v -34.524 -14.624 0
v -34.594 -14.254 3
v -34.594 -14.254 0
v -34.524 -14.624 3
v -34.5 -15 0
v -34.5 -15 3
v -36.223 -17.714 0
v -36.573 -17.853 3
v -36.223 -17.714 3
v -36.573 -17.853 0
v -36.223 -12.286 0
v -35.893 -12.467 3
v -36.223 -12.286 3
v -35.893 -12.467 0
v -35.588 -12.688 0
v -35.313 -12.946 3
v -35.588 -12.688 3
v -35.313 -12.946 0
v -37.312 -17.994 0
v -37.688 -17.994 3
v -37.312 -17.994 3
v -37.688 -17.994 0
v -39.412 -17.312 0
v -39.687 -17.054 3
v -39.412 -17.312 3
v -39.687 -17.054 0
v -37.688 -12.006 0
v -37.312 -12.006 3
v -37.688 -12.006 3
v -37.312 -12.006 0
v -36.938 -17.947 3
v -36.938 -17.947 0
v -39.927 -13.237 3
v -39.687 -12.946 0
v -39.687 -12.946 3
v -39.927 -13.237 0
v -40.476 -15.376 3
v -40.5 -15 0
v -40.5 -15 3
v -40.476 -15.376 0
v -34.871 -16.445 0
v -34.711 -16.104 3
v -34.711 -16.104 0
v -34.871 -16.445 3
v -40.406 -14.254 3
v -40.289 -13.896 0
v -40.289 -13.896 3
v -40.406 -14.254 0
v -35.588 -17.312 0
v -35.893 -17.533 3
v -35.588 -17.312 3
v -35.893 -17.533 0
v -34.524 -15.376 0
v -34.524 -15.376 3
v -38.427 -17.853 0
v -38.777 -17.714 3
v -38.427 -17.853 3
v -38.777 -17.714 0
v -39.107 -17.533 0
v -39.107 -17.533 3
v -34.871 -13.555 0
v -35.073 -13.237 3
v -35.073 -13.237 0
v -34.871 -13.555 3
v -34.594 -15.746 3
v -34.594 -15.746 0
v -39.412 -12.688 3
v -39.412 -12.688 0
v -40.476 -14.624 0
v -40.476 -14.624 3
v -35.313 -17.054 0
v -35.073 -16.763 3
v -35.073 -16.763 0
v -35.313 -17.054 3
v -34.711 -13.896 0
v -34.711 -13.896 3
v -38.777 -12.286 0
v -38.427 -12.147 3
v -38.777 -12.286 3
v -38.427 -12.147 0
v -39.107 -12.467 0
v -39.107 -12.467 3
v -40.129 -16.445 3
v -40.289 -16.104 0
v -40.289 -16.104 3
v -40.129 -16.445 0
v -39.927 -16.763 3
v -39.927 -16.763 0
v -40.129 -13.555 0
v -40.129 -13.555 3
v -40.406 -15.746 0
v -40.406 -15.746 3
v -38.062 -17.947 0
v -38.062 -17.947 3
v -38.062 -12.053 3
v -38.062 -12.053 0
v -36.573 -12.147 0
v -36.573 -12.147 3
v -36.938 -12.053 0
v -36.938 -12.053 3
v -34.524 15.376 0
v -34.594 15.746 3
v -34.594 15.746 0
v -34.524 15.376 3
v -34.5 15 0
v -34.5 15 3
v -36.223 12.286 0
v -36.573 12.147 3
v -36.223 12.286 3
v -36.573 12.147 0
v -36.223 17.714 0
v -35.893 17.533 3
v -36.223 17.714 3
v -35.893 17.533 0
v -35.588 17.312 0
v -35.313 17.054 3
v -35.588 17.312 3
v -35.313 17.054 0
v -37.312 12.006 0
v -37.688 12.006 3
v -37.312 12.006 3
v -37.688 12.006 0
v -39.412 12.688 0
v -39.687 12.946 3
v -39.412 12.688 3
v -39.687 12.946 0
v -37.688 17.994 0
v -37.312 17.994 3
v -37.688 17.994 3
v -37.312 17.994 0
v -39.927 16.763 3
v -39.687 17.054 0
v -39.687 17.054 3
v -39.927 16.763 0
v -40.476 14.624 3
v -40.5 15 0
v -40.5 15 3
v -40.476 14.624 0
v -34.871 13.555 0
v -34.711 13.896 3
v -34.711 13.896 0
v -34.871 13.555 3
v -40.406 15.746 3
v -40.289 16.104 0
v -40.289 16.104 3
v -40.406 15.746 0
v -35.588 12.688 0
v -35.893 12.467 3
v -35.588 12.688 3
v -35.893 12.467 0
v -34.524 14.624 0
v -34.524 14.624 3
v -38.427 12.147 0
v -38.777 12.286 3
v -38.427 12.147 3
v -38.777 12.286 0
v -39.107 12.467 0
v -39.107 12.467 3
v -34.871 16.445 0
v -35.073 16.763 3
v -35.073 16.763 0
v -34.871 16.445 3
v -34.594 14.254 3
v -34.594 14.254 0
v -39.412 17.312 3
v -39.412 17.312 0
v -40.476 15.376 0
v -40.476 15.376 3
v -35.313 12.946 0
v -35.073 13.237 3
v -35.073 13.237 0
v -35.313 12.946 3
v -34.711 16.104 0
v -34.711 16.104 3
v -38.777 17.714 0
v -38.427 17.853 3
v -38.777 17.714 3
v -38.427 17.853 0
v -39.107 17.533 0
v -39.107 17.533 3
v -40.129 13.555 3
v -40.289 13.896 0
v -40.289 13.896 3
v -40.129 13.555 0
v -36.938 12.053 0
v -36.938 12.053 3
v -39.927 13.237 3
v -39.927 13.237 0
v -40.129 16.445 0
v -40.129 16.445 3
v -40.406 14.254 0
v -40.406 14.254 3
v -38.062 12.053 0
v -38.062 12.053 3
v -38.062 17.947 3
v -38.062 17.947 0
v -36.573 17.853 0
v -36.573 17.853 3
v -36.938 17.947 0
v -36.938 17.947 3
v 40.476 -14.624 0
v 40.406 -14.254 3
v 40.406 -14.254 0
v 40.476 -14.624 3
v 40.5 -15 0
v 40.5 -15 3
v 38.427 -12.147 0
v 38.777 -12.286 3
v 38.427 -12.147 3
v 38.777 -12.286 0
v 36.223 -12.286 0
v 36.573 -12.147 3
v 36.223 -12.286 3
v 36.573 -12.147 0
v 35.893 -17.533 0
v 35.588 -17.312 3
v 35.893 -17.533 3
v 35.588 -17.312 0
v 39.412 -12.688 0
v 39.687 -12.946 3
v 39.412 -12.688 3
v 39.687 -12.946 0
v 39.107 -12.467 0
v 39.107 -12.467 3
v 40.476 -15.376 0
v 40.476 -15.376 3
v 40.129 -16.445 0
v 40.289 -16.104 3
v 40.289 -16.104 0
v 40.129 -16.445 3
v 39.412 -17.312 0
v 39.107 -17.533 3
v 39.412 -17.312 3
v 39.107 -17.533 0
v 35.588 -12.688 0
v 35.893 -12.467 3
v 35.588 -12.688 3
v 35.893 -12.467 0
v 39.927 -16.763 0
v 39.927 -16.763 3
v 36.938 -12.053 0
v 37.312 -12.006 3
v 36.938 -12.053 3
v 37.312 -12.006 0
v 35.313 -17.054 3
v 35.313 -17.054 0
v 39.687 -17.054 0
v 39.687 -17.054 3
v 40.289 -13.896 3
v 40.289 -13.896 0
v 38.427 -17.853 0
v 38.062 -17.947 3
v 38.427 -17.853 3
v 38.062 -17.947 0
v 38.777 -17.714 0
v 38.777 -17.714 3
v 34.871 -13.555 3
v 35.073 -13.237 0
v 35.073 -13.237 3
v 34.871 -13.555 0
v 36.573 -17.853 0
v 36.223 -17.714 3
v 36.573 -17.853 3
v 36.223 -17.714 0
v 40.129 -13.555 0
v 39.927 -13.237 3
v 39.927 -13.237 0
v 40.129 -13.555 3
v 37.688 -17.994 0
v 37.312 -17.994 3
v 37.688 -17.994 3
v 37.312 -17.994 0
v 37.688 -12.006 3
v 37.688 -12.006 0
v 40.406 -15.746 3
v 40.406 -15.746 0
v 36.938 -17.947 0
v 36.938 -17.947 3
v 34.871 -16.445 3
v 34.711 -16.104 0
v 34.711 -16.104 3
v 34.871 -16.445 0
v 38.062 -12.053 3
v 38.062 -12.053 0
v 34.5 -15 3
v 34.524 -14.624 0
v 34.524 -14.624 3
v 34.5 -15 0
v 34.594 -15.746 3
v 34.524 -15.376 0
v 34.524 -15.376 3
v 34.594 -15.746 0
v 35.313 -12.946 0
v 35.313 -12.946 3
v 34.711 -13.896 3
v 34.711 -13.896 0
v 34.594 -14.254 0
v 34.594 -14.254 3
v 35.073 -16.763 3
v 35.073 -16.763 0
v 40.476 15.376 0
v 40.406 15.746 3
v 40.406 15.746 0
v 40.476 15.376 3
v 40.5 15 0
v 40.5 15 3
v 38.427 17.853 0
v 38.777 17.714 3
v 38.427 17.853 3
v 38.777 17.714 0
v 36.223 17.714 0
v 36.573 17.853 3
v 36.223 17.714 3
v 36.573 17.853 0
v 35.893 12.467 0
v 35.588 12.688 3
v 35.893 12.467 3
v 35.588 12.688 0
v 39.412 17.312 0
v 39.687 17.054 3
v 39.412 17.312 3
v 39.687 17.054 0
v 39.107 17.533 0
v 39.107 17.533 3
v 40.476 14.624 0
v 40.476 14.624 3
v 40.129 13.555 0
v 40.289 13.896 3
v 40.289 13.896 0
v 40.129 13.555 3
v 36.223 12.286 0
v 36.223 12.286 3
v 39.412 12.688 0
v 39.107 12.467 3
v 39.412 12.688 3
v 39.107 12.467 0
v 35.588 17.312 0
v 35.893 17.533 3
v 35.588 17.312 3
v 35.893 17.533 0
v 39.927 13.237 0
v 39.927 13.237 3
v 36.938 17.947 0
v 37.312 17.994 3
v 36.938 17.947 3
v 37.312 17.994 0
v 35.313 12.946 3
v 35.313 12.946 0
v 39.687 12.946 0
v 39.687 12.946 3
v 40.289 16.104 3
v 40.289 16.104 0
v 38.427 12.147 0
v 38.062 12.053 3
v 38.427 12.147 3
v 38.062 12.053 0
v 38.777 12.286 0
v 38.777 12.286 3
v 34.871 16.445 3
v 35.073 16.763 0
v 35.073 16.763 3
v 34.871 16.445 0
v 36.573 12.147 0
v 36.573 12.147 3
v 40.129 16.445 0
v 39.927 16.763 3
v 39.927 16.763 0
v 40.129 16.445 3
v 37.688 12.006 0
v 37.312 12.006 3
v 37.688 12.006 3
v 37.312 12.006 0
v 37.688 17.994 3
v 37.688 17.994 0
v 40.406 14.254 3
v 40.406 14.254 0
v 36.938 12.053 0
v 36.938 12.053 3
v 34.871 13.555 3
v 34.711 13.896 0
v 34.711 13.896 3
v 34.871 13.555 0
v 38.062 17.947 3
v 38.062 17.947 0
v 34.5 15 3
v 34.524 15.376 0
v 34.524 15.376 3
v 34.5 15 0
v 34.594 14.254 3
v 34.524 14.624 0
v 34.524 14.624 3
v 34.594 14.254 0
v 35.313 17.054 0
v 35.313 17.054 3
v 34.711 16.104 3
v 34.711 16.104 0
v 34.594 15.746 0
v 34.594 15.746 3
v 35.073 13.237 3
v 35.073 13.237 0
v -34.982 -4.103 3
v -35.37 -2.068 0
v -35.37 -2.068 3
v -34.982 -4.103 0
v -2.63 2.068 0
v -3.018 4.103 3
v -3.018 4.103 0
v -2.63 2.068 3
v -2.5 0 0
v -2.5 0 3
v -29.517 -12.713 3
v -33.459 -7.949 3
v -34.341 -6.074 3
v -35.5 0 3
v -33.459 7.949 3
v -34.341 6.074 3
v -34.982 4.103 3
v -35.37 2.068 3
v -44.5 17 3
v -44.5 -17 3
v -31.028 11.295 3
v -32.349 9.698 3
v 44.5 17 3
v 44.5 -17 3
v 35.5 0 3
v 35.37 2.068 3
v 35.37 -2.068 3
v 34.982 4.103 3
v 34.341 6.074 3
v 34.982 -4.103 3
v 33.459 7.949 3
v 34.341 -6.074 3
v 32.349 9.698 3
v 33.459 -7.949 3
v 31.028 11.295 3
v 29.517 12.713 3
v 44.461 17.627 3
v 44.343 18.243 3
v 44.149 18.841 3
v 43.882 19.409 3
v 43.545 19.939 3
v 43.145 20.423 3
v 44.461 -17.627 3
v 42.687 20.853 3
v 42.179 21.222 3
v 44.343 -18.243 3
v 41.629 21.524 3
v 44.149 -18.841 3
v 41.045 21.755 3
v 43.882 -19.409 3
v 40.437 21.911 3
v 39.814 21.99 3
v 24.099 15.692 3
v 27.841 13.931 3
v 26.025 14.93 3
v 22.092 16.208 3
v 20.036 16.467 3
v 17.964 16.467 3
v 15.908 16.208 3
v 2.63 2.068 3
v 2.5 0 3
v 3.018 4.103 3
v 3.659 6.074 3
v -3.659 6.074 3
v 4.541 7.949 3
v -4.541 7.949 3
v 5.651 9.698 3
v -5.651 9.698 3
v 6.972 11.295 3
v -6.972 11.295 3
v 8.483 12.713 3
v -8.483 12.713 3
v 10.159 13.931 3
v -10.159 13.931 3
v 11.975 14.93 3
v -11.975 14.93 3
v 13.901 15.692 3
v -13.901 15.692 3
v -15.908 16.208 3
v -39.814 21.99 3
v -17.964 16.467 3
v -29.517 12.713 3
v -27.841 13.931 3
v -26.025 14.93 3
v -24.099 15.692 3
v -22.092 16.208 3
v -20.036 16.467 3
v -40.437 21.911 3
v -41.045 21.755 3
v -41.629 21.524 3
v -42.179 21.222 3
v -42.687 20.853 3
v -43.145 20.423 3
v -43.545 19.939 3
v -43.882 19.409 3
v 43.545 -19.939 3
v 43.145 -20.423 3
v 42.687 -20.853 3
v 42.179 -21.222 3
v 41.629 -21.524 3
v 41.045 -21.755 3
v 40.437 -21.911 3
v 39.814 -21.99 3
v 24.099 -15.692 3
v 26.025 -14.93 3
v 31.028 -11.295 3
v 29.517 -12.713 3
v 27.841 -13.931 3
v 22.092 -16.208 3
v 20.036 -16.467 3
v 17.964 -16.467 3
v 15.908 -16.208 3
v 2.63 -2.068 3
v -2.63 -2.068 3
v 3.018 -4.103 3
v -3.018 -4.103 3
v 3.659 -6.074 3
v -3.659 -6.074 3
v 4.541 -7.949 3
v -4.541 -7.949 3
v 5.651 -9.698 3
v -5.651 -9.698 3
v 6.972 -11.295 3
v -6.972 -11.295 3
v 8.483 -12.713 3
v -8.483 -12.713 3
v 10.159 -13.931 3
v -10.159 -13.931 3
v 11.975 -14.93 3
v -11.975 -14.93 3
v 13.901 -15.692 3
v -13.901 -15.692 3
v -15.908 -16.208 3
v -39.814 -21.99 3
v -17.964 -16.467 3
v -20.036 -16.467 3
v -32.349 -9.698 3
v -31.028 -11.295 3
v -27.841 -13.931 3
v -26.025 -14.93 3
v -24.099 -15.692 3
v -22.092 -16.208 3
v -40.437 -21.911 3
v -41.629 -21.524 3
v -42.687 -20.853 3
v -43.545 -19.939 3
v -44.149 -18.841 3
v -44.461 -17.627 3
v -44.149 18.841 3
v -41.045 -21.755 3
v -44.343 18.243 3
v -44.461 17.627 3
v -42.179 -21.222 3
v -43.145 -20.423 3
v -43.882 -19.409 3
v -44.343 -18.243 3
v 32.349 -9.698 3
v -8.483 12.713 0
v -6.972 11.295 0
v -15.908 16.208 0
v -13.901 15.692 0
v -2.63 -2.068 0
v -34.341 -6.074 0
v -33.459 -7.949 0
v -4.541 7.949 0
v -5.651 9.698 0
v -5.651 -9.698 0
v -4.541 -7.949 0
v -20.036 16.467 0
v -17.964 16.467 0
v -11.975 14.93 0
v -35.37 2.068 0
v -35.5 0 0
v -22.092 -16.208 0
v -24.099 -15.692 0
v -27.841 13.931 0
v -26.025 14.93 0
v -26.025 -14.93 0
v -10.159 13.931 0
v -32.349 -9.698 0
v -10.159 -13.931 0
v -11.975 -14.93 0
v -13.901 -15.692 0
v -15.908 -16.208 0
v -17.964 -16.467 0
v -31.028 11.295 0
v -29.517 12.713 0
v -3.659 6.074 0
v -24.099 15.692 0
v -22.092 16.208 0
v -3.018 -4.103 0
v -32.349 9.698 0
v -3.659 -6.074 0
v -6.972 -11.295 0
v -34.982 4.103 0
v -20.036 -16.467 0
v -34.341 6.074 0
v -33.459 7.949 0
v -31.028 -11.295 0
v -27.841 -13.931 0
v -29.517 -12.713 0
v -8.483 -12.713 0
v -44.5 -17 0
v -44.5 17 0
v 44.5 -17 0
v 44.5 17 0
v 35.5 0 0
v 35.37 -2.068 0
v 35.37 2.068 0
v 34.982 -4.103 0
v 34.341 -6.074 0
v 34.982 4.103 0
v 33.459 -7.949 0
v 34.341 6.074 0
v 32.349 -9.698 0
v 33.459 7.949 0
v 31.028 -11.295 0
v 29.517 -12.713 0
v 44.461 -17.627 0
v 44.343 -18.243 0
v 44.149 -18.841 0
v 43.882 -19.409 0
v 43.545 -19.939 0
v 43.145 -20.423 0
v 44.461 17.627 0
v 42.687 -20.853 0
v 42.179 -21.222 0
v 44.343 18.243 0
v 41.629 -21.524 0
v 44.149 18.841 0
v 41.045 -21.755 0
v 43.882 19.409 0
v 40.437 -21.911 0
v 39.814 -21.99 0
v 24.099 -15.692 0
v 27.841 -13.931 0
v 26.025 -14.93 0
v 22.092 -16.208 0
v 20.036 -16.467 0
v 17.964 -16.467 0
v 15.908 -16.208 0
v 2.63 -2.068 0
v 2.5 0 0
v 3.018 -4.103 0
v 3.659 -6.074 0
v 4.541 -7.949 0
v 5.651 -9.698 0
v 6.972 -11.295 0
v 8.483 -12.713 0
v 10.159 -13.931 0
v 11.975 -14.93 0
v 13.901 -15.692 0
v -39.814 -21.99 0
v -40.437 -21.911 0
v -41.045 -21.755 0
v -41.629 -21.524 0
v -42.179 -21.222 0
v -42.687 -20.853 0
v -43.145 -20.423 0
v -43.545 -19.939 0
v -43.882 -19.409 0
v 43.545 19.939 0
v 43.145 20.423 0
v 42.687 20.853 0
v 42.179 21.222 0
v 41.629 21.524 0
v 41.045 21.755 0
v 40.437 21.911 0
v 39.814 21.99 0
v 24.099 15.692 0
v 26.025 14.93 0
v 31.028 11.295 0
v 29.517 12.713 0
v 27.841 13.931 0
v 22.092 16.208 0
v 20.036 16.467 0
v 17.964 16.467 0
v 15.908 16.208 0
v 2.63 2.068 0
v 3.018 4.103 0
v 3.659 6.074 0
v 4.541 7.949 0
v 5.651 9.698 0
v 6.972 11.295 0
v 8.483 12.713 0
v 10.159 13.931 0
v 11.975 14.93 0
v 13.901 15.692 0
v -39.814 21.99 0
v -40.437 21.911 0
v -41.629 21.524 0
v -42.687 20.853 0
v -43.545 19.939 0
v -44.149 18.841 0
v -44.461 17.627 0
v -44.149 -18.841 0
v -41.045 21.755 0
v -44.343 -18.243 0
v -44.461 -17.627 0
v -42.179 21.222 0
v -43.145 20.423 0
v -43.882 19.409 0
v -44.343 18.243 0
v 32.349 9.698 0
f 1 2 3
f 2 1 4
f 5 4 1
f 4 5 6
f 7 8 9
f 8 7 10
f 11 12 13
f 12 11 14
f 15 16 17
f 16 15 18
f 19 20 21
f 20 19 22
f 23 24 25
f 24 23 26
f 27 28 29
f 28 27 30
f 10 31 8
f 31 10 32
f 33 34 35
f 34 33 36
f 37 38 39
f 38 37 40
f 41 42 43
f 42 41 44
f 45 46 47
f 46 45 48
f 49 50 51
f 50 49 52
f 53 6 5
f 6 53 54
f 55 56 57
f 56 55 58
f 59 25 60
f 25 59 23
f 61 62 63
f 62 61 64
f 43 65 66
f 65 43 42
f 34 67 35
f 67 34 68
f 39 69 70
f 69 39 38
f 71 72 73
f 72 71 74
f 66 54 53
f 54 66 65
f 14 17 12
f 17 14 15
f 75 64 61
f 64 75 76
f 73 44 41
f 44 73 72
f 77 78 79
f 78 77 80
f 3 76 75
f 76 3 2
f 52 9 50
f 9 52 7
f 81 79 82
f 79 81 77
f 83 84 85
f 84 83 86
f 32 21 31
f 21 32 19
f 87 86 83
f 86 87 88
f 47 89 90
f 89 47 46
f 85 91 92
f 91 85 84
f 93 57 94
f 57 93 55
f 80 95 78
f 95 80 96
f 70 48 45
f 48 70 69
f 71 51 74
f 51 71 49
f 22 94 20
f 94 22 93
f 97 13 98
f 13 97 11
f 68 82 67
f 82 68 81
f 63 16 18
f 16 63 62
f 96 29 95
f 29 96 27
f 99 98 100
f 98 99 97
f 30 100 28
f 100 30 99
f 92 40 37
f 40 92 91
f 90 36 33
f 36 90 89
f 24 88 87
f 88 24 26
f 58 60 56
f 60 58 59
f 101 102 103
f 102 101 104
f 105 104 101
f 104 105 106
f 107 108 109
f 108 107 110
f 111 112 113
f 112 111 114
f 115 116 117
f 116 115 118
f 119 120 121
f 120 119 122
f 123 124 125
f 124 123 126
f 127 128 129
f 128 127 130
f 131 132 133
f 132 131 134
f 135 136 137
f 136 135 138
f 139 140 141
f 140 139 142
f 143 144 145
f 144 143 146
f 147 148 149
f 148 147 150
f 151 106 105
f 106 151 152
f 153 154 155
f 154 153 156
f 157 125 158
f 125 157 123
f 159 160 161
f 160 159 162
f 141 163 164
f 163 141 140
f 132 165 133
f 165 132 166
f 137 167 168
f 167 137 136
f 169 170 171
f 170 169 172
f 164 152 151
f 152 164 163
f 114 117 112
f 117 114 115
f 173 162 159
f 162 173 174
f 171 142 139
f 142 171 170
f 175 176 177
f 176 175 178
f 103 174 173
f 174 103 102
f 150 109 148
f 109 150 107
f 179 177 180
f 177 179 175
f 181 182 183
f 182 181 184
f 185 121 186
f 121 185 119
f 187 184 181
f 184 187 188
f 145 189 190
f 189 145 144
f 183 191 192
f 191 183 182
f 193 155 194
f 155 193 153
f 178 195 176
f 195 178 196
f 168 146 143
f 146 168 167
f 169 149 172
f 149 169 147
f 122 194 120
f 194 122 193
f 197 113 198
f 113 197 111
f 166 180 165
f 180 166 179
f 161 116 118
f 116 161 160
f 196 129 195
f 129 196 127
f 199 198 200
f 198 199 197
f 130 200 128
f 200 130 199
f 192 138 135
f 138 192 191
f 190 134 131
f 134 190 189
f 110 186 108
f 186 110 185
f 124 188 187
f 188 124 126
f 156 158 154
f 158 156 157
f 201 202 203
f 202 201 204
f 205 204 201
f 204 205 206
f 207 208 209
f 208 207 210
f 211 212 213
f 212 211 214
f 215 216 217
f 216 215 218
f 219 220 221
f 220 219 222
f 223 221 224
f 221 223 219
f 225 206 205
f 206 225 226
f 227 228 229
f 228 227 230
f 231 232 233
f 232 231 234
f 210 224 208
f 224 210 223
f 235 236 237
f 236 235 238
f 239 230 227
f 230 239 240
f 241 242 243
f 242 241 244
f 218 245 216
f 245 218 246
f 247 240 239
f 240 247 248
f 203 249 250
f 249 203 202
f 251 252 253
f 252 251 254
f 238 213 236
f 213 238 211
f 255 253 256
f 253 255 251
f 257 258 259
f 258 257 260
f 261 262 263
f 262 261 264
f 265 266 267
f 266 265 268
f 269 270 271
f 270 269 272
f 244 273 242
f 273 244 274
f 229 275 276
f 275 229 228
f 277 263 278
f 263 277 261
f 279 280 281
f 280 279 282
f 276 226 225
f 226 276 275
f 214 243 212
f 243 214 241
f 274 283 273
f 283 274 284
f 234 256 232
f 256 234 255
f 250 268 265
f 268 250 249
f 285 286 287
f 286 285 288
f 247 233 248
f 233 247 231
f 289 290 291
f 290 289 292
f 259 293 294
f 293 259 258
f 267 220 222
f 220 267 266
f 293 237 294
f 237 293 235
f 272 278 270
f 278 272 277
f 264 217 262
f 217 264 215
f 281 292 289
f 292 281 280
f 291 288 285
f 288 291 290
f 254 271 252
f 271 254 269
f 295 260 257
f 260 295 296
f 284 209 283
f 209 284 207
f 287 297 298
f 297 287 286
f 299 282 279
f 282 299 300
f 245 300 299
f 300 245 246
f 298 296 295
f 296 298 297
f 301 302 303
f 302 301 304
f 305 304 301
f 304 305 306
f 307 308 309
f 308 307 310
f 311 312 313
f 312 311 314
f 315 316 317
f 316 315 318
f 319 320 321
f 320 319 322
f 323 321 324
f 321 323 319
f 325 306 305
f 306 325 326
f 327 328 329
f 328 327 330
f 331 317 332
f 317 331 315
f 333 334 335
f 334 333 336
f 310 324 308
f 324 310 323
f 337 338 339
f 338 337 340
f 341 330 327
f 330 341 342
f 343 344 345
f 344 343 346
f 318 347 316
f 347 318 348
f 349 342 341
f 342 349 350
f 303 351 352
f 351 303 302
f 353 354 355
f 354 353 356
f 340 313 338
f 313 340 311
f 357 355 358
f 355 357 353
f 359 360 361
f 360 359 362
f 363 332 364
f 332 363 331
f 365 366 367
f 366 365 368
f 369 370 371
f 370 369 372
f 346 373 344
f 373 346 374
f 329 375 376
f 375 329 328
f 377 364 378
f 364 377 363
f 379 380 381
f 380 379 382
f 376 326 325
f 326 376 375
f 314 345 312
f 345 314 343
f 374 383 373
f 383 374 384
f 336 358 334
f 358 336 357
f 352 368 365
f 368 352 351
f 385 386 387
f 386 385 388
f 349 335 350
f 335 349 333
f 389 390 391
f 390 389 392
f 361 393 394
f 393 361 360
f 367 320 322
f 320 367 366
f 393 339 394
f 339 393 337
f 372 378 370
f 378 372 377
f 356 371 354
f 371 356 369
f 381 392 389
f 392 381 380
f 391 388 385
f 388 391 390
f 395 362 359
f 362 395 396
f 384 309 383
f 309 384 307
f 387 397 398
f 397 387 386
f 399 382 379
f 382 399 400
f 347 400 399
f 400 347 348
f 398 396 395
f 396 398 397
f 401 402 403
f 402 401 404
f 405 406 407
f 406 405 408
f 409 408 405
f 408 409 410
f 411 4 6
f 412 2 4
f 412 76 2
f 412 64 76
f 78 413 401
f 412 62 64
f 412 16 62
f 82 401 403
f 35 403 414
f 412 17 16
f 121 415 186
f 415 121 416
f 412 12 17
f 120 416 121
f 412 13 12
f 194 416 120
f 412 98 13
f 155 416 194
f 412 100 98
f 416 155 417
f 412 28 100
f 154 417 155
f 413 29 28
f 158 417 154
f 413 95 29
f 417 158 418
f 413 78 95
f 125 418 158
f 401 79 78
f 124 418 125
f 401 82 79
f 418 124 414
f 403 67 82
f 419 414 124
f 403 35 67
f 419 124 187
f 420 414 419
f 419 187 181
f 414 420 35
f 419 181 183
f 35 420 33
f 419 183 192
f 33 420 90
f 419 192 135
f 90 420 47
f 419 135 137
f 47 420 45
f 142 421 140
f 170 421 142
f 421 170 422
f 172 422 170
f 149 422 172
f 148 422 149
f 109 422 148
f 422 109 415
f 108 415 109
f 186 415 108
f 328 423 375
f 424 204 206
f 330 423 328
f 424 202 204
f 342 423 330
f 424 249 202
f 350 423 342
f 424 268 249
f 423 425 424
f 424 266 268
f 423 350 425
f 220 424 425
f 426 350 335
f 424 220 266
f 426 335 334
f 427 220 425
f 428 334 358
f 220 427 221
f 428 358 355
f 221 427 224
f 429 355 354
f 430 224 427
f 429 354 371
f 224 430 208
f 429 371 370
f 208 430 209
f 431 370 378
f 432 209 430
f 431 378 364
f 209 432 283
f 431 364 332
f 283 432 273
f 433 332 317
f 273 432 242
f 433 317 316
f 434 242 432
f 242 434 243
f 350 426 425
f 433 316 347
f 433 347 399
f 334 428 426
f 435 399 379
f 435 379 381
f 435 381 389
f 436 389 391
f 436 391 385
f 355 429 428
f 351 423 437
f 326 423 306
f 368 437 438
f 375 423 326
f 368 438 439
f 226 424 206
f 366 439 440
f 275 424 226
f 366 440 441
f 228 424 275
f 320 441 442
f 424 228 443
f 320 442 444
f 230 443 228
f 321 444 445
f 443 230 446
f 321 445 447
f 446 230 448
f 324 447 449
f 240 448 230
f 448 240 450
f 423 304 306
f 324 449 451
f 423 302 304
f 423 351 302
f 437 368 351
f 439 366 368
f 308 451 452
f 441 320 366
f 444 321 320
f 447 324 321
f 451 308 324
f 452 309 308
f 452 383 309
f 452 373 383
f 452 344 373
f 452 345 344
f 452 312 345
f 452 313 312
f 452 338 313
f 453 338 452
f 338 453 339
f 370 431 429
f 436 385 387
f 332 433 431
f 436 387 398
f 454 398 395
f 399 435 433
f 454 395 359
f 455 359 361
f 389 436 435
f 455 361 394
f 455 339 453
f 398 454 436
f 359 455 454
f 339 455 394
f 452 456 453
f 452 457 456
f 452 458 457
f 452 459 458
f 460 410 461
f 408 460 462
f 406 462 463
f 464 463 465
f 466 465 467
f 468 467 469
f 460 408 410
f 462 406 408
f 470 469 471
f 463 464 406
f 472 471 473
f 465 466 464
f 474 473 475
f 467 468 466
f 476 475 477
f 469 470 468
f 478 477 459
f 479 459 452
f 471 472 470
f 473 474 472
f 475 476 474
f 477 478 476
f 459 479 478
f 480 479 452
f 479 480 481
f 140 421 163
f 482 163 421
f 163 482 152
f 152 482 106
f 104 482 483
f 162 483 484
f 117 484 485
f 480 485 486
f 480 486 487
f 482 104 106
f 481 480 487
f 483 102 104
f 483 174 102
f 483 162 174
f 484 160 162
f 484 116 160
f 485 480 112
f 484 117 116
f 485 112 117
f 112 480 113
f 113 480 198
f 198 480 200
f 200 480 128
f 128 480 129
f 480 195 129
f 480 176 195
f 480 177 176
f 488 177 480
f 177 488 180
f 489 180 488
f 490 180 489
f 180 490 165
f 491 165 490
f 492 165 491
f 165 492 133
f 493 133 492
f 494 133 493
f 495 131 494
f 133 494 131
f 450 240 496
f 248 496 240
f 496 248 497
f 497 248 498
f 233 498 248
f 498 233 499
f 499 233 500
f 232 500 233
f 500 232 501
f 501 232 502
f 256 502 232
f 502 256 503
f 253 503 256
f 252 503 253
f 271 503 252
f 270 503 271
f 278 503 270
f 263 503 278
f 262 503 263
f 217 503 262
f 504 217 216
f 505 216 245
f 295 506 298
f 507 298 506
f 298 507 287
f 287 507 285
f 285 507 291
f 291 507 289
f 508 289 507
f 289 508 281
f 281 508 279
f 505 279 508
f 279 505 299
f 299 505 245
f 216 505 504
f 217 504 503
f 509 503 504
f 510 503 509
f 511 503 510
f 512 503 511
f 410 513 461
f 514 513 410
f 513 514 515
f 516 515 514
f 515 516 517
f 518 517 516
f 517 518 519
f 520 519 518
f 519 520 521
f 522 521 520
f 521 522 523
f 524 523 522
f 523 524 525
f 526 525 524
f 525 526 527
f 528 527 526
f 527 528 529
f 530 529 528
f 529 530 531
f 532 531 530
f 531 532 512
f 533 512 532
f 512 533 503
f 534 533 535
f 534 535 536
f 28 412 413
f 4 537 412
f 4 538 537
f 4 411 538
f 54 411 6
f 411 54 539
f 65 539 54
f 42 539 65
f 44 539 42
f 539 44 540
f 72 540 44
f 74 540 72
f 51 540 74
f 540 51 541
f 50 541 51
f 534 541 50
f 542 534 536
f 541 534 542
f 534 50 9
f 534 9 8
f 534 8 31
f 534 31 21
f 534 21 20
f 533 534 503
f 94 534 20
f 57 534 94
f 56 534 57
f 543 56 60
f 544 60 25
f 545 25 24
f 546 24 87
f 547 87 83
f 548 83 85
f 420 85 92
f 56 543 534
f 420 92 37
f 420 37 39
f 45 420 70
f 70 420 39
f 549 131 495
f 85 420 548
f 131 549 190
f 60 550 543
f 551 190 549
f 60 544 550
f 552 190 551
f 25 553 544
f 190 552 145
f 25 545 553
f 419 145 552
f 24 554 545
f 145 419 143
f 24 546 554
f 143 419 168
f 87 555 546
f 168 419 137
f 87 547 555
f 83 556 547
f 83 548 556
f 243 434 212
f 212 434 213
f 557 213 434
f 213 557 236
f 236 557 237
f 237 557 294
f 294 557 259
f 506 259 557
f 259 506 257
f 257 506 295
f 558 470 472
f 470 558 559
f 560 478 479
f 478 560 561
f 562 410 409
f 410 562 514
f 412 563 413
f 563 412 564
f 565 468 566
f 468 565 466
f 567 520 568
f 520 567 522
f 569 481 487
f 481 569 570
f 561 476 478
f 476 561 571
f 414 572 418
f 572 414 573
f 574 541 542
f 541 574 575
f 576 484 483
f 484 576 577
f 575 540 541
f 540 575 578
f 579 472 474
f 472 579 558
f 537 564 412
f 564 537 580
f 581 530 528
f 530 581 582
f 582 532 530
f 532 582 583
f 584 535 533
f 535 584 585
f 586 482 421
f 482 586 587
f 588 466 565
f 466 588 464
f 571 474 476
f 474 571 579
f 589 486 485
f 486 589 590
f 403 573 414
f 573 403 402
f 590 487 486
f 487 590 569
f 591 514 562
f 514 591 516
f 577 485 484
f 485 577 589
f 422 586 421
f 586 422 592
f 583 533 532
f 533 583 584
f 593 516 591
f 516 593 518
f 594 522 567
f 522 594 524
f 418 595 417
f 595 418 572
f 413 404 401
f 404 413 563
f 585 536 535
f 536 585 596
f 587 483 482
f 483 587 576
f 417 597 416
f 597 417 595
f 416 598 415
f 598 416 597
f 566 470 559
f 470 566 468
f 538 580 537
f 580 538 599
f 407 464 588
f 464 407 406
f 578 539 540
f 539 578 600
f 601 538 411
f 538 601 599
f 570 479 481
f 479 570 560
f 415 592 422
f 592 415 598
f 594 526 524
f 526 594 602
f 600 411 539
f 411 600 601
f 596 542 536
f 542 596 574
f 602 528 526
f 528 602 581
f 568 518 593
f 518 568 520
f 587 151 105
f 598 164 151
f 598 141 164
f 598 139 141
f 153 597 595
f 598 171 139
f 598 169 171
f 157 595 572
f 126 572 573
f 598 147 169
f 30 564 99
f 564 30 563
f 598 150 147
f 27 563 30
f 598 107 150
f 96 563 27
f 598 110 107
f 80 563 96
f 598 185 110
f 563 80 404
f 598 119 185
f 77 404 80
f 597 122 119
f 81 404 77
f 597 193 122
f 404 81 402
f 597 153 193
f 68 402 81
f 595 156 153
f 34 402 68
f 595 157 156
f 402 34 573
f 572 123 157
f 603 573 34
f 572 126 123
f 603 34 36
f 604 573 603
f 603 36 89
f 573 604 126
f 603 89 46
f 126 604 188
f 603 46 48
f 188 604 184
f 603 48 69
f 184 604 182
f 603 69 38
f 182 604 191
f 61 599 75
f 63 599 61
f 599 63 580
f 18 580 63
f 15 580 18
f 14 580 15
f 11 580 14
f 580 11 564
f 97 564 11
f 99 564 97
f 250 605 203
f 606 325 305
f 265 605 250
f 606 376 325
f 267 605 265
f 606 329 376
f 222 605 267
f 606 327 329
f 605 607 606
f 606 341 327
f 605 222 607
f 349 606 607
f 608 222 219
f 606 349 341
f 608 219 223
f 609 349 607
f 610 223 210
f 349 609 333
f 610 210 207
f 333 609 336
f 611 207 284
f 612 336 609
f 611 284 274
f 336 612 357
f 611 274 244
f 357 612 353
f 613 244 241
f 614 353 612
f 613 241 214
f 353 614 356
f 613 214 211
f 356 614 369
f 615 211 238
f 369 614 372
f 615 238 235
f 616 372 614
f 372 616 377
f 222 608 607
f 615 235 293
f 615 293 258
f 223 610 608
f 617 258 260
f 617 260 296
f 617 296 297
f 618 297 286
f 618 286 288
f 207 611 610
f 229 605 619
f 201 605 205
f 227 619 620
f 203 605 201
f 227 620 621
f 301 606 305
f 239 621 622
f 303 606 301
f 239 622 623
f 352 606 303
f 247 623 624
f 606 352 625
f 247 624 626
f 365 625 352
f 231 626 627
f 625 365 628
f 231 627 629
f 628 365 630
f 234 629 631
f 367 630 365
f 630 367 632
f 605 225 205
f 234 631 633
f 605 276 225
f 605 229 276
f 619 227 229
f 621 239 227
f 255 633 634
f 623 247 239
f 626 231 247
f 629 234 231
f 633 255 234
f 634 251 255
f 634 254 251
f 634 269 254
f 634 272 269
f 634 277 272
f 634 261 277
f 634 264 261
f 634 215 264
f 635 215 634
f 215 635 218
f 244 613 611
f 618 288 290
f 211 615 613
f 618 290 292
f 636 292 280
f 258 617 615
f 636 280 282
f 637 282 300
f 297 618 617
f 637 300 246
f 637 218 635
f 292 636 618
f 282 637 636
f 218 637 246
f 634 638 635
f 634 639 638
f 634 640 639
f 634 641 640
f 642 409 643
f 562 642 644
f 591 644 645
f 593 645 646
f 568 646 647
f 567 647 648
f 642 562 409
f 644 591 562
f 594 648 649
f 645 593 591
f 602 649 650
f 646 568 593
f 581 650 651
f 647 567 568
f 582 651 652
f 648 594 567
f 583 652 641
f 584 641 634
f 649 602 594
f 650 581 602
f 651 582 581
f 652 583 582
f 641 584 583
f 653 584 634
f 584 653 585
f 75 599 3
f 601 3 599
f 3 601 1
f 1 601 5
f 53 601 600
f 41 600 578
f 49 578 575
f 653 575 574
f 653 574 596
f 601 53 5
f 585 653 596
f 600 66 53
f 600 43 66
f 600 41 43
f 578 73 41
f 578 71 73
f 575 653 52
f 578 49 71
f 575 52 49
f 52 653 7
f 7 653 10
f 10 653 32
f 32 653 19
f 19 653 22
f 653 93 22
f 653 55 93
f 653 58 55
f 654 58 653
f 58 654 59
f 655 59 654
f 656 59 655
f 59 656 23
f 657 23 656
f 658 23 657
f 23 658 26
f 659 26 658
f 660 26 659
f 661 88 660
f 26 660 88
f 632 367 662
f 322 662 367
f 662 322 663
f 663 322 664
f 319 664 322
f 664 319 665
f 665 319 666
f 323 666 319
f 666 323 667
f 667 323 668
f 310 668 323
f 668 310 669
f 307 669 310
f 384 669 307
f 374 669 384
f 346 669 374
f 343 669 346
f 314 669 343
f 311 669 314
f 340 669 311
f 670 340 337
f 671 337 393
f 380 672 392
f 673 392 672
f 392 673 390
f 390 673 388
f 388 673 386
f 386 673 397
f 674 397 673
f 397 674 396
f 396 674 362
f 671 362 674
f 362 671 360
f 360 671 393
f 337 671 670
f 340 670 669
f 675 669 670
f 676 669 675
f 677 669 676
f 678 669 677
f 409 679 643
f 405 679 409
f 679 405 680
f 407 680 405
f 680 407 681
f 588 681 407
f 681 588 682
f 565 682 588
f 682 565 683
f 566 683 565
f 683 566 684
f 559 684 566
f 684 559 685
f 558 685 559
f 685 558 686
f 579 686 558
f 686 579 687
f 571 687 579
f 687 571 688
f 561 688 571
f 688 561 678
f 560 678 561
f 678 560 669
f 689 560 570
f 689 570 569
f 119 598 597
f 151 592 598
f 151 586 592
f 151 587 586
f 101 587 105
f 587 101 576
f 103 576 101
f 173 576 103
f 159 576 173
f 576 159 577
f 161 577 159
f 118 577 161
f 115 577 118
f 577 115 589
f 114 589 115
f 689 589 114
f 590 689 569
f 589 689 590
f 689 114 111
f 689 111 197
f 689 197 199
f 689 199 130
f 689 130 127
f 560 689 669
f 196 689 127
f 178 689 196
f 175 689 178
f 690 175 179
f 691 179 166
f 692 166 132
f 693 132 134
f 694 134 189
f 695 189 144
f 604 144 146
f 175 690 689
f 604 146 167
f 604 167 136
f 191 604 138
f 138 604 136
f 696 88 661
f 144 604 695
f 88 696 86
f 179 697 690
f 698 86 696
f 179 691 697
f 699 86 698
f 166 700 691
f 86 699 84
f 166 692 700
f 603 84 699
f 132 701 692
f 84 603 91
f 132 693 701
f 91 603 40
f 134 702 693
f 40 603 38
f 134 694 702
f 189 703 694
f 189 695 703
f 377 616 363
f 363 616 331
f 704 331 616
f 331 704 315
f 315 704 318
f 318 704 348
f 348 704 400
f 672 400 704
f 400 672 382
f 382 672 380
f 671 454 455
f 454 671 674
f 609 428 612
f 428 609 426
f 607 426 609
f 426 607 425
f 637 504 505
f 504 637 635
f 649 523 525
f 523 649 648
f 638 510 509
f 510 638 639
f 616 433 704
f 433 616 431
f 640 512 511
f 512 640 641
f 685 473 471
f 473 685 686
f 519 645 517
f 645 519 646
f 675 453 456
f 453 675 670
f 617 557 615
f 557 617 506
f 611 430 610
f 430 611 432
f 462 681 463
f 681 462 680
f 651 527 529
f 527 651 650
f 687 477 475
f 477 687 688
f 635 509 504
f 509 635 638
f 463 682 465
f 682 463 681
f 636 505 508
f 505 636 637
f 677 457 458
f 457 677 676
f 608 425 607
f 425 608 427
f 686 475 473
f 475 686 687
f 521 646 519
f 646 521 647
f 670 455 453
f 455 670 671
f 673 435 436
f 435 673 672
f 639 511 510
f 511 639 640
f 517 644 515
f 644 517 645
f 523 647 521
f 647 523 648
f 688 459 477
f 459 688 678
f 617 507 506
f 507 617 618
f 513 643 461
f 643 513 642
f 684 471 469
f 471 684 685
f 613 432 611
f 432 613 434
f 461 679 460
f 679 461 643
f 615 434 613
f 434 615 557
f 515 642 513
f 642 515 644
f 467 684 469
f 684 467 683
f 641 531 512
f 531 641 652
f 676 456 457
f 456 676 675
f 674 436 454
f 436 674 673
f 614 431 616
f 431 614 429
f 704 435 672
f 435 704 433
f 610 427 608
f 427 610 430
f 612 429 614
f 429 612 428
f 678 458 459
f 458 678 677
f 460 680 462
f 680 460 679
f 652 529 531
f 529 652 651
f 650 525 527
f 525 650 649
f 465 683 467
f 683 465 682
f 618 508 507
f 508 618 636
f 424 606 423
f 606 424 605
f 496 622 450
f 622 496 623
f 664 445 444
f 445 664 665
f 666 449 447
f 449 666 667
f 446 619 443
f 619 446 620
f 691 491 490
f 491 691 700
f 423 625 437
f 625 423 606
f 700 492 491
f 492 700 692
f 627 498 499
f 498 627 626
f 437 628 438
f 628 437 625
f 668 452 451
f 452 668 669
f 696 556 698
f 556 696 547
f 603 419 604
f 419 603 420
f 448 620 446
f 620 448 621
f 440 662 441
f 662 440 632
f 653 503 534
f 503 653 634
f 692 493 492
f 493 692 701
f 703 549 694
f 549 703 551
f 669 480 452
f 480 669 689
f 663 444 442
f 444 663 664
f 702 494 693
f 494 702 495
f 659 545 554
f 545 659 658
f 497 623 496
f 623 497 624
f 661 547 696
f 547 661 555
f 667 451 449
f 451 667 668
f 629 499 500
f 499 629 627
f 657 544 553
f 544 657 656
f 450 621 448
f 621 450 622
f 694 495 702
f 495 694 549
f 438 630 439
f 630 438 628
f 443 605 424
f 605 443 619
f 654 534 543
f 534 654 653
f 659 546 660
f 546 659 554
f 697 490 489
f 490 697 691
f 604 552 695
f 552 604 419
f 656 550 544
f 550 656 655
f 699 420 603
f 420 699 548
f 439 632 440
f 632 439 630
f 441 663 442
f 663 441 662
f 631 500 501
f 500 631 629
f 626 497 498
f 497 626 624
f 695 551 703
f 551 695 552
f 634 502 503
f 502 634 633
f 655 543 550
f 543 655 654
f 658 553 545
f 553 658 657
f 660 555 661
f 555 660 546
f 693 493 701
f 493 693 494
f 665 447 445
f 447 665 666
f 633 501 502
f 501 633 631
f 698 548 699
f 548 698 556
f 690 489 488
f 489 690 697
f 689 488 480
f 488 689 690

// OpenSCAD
$fn = 50;


difference() {
	union() {
		hull() {
			translate(v = [-39.5000000000, 17.0000000000, 0]) {
				cylinder(h = 3, r = 5);
			}
			translate(v = [39.5000000000, 17.0000000000, 0]) {
				cylinder(h = 3, r = 5);
			}
			translate(v = [-39.5000000000, -17.0000000000, 0]) {
				cylinder(h = 3, r = 5);
			}
			translate(v = [39.5000000000, -17.0000000000, 0]) {
				cylinder(h = 3, r = 5);
			}
		}
	}
	union() {
		#translate(v = [-37.5000000000, -15.0000000000, -100.0000000000]) {
			cylinder(h = 200, r = 3.0000000000);
		}
		#translate(v = [-37.5000000000, 15.0000000000, -100.0000000000]) {
			cylinder(h = 200, r = 3.0000000000);
		}
		#translate(v = [37.5000000000, -15.0000000000, -100.0000000000]) {
			cylinder(h = 200, r = 3.0000000000);
		}
		#translate(v = [37.5000000000, 15.0000000000, -100.0000000000]) {
			cylinder(h = 200, r = 3.0000000000);
		}
		#translate(v = [-19.0000000000, 0, 0]) {
			cylinder(h = 3, r = 16.5000000000);
		}
		#translate(v = [19.0000000000, 0, 0]) {
			cylinder(h = 3, r = 16.5000000000);
		}
	}
}
